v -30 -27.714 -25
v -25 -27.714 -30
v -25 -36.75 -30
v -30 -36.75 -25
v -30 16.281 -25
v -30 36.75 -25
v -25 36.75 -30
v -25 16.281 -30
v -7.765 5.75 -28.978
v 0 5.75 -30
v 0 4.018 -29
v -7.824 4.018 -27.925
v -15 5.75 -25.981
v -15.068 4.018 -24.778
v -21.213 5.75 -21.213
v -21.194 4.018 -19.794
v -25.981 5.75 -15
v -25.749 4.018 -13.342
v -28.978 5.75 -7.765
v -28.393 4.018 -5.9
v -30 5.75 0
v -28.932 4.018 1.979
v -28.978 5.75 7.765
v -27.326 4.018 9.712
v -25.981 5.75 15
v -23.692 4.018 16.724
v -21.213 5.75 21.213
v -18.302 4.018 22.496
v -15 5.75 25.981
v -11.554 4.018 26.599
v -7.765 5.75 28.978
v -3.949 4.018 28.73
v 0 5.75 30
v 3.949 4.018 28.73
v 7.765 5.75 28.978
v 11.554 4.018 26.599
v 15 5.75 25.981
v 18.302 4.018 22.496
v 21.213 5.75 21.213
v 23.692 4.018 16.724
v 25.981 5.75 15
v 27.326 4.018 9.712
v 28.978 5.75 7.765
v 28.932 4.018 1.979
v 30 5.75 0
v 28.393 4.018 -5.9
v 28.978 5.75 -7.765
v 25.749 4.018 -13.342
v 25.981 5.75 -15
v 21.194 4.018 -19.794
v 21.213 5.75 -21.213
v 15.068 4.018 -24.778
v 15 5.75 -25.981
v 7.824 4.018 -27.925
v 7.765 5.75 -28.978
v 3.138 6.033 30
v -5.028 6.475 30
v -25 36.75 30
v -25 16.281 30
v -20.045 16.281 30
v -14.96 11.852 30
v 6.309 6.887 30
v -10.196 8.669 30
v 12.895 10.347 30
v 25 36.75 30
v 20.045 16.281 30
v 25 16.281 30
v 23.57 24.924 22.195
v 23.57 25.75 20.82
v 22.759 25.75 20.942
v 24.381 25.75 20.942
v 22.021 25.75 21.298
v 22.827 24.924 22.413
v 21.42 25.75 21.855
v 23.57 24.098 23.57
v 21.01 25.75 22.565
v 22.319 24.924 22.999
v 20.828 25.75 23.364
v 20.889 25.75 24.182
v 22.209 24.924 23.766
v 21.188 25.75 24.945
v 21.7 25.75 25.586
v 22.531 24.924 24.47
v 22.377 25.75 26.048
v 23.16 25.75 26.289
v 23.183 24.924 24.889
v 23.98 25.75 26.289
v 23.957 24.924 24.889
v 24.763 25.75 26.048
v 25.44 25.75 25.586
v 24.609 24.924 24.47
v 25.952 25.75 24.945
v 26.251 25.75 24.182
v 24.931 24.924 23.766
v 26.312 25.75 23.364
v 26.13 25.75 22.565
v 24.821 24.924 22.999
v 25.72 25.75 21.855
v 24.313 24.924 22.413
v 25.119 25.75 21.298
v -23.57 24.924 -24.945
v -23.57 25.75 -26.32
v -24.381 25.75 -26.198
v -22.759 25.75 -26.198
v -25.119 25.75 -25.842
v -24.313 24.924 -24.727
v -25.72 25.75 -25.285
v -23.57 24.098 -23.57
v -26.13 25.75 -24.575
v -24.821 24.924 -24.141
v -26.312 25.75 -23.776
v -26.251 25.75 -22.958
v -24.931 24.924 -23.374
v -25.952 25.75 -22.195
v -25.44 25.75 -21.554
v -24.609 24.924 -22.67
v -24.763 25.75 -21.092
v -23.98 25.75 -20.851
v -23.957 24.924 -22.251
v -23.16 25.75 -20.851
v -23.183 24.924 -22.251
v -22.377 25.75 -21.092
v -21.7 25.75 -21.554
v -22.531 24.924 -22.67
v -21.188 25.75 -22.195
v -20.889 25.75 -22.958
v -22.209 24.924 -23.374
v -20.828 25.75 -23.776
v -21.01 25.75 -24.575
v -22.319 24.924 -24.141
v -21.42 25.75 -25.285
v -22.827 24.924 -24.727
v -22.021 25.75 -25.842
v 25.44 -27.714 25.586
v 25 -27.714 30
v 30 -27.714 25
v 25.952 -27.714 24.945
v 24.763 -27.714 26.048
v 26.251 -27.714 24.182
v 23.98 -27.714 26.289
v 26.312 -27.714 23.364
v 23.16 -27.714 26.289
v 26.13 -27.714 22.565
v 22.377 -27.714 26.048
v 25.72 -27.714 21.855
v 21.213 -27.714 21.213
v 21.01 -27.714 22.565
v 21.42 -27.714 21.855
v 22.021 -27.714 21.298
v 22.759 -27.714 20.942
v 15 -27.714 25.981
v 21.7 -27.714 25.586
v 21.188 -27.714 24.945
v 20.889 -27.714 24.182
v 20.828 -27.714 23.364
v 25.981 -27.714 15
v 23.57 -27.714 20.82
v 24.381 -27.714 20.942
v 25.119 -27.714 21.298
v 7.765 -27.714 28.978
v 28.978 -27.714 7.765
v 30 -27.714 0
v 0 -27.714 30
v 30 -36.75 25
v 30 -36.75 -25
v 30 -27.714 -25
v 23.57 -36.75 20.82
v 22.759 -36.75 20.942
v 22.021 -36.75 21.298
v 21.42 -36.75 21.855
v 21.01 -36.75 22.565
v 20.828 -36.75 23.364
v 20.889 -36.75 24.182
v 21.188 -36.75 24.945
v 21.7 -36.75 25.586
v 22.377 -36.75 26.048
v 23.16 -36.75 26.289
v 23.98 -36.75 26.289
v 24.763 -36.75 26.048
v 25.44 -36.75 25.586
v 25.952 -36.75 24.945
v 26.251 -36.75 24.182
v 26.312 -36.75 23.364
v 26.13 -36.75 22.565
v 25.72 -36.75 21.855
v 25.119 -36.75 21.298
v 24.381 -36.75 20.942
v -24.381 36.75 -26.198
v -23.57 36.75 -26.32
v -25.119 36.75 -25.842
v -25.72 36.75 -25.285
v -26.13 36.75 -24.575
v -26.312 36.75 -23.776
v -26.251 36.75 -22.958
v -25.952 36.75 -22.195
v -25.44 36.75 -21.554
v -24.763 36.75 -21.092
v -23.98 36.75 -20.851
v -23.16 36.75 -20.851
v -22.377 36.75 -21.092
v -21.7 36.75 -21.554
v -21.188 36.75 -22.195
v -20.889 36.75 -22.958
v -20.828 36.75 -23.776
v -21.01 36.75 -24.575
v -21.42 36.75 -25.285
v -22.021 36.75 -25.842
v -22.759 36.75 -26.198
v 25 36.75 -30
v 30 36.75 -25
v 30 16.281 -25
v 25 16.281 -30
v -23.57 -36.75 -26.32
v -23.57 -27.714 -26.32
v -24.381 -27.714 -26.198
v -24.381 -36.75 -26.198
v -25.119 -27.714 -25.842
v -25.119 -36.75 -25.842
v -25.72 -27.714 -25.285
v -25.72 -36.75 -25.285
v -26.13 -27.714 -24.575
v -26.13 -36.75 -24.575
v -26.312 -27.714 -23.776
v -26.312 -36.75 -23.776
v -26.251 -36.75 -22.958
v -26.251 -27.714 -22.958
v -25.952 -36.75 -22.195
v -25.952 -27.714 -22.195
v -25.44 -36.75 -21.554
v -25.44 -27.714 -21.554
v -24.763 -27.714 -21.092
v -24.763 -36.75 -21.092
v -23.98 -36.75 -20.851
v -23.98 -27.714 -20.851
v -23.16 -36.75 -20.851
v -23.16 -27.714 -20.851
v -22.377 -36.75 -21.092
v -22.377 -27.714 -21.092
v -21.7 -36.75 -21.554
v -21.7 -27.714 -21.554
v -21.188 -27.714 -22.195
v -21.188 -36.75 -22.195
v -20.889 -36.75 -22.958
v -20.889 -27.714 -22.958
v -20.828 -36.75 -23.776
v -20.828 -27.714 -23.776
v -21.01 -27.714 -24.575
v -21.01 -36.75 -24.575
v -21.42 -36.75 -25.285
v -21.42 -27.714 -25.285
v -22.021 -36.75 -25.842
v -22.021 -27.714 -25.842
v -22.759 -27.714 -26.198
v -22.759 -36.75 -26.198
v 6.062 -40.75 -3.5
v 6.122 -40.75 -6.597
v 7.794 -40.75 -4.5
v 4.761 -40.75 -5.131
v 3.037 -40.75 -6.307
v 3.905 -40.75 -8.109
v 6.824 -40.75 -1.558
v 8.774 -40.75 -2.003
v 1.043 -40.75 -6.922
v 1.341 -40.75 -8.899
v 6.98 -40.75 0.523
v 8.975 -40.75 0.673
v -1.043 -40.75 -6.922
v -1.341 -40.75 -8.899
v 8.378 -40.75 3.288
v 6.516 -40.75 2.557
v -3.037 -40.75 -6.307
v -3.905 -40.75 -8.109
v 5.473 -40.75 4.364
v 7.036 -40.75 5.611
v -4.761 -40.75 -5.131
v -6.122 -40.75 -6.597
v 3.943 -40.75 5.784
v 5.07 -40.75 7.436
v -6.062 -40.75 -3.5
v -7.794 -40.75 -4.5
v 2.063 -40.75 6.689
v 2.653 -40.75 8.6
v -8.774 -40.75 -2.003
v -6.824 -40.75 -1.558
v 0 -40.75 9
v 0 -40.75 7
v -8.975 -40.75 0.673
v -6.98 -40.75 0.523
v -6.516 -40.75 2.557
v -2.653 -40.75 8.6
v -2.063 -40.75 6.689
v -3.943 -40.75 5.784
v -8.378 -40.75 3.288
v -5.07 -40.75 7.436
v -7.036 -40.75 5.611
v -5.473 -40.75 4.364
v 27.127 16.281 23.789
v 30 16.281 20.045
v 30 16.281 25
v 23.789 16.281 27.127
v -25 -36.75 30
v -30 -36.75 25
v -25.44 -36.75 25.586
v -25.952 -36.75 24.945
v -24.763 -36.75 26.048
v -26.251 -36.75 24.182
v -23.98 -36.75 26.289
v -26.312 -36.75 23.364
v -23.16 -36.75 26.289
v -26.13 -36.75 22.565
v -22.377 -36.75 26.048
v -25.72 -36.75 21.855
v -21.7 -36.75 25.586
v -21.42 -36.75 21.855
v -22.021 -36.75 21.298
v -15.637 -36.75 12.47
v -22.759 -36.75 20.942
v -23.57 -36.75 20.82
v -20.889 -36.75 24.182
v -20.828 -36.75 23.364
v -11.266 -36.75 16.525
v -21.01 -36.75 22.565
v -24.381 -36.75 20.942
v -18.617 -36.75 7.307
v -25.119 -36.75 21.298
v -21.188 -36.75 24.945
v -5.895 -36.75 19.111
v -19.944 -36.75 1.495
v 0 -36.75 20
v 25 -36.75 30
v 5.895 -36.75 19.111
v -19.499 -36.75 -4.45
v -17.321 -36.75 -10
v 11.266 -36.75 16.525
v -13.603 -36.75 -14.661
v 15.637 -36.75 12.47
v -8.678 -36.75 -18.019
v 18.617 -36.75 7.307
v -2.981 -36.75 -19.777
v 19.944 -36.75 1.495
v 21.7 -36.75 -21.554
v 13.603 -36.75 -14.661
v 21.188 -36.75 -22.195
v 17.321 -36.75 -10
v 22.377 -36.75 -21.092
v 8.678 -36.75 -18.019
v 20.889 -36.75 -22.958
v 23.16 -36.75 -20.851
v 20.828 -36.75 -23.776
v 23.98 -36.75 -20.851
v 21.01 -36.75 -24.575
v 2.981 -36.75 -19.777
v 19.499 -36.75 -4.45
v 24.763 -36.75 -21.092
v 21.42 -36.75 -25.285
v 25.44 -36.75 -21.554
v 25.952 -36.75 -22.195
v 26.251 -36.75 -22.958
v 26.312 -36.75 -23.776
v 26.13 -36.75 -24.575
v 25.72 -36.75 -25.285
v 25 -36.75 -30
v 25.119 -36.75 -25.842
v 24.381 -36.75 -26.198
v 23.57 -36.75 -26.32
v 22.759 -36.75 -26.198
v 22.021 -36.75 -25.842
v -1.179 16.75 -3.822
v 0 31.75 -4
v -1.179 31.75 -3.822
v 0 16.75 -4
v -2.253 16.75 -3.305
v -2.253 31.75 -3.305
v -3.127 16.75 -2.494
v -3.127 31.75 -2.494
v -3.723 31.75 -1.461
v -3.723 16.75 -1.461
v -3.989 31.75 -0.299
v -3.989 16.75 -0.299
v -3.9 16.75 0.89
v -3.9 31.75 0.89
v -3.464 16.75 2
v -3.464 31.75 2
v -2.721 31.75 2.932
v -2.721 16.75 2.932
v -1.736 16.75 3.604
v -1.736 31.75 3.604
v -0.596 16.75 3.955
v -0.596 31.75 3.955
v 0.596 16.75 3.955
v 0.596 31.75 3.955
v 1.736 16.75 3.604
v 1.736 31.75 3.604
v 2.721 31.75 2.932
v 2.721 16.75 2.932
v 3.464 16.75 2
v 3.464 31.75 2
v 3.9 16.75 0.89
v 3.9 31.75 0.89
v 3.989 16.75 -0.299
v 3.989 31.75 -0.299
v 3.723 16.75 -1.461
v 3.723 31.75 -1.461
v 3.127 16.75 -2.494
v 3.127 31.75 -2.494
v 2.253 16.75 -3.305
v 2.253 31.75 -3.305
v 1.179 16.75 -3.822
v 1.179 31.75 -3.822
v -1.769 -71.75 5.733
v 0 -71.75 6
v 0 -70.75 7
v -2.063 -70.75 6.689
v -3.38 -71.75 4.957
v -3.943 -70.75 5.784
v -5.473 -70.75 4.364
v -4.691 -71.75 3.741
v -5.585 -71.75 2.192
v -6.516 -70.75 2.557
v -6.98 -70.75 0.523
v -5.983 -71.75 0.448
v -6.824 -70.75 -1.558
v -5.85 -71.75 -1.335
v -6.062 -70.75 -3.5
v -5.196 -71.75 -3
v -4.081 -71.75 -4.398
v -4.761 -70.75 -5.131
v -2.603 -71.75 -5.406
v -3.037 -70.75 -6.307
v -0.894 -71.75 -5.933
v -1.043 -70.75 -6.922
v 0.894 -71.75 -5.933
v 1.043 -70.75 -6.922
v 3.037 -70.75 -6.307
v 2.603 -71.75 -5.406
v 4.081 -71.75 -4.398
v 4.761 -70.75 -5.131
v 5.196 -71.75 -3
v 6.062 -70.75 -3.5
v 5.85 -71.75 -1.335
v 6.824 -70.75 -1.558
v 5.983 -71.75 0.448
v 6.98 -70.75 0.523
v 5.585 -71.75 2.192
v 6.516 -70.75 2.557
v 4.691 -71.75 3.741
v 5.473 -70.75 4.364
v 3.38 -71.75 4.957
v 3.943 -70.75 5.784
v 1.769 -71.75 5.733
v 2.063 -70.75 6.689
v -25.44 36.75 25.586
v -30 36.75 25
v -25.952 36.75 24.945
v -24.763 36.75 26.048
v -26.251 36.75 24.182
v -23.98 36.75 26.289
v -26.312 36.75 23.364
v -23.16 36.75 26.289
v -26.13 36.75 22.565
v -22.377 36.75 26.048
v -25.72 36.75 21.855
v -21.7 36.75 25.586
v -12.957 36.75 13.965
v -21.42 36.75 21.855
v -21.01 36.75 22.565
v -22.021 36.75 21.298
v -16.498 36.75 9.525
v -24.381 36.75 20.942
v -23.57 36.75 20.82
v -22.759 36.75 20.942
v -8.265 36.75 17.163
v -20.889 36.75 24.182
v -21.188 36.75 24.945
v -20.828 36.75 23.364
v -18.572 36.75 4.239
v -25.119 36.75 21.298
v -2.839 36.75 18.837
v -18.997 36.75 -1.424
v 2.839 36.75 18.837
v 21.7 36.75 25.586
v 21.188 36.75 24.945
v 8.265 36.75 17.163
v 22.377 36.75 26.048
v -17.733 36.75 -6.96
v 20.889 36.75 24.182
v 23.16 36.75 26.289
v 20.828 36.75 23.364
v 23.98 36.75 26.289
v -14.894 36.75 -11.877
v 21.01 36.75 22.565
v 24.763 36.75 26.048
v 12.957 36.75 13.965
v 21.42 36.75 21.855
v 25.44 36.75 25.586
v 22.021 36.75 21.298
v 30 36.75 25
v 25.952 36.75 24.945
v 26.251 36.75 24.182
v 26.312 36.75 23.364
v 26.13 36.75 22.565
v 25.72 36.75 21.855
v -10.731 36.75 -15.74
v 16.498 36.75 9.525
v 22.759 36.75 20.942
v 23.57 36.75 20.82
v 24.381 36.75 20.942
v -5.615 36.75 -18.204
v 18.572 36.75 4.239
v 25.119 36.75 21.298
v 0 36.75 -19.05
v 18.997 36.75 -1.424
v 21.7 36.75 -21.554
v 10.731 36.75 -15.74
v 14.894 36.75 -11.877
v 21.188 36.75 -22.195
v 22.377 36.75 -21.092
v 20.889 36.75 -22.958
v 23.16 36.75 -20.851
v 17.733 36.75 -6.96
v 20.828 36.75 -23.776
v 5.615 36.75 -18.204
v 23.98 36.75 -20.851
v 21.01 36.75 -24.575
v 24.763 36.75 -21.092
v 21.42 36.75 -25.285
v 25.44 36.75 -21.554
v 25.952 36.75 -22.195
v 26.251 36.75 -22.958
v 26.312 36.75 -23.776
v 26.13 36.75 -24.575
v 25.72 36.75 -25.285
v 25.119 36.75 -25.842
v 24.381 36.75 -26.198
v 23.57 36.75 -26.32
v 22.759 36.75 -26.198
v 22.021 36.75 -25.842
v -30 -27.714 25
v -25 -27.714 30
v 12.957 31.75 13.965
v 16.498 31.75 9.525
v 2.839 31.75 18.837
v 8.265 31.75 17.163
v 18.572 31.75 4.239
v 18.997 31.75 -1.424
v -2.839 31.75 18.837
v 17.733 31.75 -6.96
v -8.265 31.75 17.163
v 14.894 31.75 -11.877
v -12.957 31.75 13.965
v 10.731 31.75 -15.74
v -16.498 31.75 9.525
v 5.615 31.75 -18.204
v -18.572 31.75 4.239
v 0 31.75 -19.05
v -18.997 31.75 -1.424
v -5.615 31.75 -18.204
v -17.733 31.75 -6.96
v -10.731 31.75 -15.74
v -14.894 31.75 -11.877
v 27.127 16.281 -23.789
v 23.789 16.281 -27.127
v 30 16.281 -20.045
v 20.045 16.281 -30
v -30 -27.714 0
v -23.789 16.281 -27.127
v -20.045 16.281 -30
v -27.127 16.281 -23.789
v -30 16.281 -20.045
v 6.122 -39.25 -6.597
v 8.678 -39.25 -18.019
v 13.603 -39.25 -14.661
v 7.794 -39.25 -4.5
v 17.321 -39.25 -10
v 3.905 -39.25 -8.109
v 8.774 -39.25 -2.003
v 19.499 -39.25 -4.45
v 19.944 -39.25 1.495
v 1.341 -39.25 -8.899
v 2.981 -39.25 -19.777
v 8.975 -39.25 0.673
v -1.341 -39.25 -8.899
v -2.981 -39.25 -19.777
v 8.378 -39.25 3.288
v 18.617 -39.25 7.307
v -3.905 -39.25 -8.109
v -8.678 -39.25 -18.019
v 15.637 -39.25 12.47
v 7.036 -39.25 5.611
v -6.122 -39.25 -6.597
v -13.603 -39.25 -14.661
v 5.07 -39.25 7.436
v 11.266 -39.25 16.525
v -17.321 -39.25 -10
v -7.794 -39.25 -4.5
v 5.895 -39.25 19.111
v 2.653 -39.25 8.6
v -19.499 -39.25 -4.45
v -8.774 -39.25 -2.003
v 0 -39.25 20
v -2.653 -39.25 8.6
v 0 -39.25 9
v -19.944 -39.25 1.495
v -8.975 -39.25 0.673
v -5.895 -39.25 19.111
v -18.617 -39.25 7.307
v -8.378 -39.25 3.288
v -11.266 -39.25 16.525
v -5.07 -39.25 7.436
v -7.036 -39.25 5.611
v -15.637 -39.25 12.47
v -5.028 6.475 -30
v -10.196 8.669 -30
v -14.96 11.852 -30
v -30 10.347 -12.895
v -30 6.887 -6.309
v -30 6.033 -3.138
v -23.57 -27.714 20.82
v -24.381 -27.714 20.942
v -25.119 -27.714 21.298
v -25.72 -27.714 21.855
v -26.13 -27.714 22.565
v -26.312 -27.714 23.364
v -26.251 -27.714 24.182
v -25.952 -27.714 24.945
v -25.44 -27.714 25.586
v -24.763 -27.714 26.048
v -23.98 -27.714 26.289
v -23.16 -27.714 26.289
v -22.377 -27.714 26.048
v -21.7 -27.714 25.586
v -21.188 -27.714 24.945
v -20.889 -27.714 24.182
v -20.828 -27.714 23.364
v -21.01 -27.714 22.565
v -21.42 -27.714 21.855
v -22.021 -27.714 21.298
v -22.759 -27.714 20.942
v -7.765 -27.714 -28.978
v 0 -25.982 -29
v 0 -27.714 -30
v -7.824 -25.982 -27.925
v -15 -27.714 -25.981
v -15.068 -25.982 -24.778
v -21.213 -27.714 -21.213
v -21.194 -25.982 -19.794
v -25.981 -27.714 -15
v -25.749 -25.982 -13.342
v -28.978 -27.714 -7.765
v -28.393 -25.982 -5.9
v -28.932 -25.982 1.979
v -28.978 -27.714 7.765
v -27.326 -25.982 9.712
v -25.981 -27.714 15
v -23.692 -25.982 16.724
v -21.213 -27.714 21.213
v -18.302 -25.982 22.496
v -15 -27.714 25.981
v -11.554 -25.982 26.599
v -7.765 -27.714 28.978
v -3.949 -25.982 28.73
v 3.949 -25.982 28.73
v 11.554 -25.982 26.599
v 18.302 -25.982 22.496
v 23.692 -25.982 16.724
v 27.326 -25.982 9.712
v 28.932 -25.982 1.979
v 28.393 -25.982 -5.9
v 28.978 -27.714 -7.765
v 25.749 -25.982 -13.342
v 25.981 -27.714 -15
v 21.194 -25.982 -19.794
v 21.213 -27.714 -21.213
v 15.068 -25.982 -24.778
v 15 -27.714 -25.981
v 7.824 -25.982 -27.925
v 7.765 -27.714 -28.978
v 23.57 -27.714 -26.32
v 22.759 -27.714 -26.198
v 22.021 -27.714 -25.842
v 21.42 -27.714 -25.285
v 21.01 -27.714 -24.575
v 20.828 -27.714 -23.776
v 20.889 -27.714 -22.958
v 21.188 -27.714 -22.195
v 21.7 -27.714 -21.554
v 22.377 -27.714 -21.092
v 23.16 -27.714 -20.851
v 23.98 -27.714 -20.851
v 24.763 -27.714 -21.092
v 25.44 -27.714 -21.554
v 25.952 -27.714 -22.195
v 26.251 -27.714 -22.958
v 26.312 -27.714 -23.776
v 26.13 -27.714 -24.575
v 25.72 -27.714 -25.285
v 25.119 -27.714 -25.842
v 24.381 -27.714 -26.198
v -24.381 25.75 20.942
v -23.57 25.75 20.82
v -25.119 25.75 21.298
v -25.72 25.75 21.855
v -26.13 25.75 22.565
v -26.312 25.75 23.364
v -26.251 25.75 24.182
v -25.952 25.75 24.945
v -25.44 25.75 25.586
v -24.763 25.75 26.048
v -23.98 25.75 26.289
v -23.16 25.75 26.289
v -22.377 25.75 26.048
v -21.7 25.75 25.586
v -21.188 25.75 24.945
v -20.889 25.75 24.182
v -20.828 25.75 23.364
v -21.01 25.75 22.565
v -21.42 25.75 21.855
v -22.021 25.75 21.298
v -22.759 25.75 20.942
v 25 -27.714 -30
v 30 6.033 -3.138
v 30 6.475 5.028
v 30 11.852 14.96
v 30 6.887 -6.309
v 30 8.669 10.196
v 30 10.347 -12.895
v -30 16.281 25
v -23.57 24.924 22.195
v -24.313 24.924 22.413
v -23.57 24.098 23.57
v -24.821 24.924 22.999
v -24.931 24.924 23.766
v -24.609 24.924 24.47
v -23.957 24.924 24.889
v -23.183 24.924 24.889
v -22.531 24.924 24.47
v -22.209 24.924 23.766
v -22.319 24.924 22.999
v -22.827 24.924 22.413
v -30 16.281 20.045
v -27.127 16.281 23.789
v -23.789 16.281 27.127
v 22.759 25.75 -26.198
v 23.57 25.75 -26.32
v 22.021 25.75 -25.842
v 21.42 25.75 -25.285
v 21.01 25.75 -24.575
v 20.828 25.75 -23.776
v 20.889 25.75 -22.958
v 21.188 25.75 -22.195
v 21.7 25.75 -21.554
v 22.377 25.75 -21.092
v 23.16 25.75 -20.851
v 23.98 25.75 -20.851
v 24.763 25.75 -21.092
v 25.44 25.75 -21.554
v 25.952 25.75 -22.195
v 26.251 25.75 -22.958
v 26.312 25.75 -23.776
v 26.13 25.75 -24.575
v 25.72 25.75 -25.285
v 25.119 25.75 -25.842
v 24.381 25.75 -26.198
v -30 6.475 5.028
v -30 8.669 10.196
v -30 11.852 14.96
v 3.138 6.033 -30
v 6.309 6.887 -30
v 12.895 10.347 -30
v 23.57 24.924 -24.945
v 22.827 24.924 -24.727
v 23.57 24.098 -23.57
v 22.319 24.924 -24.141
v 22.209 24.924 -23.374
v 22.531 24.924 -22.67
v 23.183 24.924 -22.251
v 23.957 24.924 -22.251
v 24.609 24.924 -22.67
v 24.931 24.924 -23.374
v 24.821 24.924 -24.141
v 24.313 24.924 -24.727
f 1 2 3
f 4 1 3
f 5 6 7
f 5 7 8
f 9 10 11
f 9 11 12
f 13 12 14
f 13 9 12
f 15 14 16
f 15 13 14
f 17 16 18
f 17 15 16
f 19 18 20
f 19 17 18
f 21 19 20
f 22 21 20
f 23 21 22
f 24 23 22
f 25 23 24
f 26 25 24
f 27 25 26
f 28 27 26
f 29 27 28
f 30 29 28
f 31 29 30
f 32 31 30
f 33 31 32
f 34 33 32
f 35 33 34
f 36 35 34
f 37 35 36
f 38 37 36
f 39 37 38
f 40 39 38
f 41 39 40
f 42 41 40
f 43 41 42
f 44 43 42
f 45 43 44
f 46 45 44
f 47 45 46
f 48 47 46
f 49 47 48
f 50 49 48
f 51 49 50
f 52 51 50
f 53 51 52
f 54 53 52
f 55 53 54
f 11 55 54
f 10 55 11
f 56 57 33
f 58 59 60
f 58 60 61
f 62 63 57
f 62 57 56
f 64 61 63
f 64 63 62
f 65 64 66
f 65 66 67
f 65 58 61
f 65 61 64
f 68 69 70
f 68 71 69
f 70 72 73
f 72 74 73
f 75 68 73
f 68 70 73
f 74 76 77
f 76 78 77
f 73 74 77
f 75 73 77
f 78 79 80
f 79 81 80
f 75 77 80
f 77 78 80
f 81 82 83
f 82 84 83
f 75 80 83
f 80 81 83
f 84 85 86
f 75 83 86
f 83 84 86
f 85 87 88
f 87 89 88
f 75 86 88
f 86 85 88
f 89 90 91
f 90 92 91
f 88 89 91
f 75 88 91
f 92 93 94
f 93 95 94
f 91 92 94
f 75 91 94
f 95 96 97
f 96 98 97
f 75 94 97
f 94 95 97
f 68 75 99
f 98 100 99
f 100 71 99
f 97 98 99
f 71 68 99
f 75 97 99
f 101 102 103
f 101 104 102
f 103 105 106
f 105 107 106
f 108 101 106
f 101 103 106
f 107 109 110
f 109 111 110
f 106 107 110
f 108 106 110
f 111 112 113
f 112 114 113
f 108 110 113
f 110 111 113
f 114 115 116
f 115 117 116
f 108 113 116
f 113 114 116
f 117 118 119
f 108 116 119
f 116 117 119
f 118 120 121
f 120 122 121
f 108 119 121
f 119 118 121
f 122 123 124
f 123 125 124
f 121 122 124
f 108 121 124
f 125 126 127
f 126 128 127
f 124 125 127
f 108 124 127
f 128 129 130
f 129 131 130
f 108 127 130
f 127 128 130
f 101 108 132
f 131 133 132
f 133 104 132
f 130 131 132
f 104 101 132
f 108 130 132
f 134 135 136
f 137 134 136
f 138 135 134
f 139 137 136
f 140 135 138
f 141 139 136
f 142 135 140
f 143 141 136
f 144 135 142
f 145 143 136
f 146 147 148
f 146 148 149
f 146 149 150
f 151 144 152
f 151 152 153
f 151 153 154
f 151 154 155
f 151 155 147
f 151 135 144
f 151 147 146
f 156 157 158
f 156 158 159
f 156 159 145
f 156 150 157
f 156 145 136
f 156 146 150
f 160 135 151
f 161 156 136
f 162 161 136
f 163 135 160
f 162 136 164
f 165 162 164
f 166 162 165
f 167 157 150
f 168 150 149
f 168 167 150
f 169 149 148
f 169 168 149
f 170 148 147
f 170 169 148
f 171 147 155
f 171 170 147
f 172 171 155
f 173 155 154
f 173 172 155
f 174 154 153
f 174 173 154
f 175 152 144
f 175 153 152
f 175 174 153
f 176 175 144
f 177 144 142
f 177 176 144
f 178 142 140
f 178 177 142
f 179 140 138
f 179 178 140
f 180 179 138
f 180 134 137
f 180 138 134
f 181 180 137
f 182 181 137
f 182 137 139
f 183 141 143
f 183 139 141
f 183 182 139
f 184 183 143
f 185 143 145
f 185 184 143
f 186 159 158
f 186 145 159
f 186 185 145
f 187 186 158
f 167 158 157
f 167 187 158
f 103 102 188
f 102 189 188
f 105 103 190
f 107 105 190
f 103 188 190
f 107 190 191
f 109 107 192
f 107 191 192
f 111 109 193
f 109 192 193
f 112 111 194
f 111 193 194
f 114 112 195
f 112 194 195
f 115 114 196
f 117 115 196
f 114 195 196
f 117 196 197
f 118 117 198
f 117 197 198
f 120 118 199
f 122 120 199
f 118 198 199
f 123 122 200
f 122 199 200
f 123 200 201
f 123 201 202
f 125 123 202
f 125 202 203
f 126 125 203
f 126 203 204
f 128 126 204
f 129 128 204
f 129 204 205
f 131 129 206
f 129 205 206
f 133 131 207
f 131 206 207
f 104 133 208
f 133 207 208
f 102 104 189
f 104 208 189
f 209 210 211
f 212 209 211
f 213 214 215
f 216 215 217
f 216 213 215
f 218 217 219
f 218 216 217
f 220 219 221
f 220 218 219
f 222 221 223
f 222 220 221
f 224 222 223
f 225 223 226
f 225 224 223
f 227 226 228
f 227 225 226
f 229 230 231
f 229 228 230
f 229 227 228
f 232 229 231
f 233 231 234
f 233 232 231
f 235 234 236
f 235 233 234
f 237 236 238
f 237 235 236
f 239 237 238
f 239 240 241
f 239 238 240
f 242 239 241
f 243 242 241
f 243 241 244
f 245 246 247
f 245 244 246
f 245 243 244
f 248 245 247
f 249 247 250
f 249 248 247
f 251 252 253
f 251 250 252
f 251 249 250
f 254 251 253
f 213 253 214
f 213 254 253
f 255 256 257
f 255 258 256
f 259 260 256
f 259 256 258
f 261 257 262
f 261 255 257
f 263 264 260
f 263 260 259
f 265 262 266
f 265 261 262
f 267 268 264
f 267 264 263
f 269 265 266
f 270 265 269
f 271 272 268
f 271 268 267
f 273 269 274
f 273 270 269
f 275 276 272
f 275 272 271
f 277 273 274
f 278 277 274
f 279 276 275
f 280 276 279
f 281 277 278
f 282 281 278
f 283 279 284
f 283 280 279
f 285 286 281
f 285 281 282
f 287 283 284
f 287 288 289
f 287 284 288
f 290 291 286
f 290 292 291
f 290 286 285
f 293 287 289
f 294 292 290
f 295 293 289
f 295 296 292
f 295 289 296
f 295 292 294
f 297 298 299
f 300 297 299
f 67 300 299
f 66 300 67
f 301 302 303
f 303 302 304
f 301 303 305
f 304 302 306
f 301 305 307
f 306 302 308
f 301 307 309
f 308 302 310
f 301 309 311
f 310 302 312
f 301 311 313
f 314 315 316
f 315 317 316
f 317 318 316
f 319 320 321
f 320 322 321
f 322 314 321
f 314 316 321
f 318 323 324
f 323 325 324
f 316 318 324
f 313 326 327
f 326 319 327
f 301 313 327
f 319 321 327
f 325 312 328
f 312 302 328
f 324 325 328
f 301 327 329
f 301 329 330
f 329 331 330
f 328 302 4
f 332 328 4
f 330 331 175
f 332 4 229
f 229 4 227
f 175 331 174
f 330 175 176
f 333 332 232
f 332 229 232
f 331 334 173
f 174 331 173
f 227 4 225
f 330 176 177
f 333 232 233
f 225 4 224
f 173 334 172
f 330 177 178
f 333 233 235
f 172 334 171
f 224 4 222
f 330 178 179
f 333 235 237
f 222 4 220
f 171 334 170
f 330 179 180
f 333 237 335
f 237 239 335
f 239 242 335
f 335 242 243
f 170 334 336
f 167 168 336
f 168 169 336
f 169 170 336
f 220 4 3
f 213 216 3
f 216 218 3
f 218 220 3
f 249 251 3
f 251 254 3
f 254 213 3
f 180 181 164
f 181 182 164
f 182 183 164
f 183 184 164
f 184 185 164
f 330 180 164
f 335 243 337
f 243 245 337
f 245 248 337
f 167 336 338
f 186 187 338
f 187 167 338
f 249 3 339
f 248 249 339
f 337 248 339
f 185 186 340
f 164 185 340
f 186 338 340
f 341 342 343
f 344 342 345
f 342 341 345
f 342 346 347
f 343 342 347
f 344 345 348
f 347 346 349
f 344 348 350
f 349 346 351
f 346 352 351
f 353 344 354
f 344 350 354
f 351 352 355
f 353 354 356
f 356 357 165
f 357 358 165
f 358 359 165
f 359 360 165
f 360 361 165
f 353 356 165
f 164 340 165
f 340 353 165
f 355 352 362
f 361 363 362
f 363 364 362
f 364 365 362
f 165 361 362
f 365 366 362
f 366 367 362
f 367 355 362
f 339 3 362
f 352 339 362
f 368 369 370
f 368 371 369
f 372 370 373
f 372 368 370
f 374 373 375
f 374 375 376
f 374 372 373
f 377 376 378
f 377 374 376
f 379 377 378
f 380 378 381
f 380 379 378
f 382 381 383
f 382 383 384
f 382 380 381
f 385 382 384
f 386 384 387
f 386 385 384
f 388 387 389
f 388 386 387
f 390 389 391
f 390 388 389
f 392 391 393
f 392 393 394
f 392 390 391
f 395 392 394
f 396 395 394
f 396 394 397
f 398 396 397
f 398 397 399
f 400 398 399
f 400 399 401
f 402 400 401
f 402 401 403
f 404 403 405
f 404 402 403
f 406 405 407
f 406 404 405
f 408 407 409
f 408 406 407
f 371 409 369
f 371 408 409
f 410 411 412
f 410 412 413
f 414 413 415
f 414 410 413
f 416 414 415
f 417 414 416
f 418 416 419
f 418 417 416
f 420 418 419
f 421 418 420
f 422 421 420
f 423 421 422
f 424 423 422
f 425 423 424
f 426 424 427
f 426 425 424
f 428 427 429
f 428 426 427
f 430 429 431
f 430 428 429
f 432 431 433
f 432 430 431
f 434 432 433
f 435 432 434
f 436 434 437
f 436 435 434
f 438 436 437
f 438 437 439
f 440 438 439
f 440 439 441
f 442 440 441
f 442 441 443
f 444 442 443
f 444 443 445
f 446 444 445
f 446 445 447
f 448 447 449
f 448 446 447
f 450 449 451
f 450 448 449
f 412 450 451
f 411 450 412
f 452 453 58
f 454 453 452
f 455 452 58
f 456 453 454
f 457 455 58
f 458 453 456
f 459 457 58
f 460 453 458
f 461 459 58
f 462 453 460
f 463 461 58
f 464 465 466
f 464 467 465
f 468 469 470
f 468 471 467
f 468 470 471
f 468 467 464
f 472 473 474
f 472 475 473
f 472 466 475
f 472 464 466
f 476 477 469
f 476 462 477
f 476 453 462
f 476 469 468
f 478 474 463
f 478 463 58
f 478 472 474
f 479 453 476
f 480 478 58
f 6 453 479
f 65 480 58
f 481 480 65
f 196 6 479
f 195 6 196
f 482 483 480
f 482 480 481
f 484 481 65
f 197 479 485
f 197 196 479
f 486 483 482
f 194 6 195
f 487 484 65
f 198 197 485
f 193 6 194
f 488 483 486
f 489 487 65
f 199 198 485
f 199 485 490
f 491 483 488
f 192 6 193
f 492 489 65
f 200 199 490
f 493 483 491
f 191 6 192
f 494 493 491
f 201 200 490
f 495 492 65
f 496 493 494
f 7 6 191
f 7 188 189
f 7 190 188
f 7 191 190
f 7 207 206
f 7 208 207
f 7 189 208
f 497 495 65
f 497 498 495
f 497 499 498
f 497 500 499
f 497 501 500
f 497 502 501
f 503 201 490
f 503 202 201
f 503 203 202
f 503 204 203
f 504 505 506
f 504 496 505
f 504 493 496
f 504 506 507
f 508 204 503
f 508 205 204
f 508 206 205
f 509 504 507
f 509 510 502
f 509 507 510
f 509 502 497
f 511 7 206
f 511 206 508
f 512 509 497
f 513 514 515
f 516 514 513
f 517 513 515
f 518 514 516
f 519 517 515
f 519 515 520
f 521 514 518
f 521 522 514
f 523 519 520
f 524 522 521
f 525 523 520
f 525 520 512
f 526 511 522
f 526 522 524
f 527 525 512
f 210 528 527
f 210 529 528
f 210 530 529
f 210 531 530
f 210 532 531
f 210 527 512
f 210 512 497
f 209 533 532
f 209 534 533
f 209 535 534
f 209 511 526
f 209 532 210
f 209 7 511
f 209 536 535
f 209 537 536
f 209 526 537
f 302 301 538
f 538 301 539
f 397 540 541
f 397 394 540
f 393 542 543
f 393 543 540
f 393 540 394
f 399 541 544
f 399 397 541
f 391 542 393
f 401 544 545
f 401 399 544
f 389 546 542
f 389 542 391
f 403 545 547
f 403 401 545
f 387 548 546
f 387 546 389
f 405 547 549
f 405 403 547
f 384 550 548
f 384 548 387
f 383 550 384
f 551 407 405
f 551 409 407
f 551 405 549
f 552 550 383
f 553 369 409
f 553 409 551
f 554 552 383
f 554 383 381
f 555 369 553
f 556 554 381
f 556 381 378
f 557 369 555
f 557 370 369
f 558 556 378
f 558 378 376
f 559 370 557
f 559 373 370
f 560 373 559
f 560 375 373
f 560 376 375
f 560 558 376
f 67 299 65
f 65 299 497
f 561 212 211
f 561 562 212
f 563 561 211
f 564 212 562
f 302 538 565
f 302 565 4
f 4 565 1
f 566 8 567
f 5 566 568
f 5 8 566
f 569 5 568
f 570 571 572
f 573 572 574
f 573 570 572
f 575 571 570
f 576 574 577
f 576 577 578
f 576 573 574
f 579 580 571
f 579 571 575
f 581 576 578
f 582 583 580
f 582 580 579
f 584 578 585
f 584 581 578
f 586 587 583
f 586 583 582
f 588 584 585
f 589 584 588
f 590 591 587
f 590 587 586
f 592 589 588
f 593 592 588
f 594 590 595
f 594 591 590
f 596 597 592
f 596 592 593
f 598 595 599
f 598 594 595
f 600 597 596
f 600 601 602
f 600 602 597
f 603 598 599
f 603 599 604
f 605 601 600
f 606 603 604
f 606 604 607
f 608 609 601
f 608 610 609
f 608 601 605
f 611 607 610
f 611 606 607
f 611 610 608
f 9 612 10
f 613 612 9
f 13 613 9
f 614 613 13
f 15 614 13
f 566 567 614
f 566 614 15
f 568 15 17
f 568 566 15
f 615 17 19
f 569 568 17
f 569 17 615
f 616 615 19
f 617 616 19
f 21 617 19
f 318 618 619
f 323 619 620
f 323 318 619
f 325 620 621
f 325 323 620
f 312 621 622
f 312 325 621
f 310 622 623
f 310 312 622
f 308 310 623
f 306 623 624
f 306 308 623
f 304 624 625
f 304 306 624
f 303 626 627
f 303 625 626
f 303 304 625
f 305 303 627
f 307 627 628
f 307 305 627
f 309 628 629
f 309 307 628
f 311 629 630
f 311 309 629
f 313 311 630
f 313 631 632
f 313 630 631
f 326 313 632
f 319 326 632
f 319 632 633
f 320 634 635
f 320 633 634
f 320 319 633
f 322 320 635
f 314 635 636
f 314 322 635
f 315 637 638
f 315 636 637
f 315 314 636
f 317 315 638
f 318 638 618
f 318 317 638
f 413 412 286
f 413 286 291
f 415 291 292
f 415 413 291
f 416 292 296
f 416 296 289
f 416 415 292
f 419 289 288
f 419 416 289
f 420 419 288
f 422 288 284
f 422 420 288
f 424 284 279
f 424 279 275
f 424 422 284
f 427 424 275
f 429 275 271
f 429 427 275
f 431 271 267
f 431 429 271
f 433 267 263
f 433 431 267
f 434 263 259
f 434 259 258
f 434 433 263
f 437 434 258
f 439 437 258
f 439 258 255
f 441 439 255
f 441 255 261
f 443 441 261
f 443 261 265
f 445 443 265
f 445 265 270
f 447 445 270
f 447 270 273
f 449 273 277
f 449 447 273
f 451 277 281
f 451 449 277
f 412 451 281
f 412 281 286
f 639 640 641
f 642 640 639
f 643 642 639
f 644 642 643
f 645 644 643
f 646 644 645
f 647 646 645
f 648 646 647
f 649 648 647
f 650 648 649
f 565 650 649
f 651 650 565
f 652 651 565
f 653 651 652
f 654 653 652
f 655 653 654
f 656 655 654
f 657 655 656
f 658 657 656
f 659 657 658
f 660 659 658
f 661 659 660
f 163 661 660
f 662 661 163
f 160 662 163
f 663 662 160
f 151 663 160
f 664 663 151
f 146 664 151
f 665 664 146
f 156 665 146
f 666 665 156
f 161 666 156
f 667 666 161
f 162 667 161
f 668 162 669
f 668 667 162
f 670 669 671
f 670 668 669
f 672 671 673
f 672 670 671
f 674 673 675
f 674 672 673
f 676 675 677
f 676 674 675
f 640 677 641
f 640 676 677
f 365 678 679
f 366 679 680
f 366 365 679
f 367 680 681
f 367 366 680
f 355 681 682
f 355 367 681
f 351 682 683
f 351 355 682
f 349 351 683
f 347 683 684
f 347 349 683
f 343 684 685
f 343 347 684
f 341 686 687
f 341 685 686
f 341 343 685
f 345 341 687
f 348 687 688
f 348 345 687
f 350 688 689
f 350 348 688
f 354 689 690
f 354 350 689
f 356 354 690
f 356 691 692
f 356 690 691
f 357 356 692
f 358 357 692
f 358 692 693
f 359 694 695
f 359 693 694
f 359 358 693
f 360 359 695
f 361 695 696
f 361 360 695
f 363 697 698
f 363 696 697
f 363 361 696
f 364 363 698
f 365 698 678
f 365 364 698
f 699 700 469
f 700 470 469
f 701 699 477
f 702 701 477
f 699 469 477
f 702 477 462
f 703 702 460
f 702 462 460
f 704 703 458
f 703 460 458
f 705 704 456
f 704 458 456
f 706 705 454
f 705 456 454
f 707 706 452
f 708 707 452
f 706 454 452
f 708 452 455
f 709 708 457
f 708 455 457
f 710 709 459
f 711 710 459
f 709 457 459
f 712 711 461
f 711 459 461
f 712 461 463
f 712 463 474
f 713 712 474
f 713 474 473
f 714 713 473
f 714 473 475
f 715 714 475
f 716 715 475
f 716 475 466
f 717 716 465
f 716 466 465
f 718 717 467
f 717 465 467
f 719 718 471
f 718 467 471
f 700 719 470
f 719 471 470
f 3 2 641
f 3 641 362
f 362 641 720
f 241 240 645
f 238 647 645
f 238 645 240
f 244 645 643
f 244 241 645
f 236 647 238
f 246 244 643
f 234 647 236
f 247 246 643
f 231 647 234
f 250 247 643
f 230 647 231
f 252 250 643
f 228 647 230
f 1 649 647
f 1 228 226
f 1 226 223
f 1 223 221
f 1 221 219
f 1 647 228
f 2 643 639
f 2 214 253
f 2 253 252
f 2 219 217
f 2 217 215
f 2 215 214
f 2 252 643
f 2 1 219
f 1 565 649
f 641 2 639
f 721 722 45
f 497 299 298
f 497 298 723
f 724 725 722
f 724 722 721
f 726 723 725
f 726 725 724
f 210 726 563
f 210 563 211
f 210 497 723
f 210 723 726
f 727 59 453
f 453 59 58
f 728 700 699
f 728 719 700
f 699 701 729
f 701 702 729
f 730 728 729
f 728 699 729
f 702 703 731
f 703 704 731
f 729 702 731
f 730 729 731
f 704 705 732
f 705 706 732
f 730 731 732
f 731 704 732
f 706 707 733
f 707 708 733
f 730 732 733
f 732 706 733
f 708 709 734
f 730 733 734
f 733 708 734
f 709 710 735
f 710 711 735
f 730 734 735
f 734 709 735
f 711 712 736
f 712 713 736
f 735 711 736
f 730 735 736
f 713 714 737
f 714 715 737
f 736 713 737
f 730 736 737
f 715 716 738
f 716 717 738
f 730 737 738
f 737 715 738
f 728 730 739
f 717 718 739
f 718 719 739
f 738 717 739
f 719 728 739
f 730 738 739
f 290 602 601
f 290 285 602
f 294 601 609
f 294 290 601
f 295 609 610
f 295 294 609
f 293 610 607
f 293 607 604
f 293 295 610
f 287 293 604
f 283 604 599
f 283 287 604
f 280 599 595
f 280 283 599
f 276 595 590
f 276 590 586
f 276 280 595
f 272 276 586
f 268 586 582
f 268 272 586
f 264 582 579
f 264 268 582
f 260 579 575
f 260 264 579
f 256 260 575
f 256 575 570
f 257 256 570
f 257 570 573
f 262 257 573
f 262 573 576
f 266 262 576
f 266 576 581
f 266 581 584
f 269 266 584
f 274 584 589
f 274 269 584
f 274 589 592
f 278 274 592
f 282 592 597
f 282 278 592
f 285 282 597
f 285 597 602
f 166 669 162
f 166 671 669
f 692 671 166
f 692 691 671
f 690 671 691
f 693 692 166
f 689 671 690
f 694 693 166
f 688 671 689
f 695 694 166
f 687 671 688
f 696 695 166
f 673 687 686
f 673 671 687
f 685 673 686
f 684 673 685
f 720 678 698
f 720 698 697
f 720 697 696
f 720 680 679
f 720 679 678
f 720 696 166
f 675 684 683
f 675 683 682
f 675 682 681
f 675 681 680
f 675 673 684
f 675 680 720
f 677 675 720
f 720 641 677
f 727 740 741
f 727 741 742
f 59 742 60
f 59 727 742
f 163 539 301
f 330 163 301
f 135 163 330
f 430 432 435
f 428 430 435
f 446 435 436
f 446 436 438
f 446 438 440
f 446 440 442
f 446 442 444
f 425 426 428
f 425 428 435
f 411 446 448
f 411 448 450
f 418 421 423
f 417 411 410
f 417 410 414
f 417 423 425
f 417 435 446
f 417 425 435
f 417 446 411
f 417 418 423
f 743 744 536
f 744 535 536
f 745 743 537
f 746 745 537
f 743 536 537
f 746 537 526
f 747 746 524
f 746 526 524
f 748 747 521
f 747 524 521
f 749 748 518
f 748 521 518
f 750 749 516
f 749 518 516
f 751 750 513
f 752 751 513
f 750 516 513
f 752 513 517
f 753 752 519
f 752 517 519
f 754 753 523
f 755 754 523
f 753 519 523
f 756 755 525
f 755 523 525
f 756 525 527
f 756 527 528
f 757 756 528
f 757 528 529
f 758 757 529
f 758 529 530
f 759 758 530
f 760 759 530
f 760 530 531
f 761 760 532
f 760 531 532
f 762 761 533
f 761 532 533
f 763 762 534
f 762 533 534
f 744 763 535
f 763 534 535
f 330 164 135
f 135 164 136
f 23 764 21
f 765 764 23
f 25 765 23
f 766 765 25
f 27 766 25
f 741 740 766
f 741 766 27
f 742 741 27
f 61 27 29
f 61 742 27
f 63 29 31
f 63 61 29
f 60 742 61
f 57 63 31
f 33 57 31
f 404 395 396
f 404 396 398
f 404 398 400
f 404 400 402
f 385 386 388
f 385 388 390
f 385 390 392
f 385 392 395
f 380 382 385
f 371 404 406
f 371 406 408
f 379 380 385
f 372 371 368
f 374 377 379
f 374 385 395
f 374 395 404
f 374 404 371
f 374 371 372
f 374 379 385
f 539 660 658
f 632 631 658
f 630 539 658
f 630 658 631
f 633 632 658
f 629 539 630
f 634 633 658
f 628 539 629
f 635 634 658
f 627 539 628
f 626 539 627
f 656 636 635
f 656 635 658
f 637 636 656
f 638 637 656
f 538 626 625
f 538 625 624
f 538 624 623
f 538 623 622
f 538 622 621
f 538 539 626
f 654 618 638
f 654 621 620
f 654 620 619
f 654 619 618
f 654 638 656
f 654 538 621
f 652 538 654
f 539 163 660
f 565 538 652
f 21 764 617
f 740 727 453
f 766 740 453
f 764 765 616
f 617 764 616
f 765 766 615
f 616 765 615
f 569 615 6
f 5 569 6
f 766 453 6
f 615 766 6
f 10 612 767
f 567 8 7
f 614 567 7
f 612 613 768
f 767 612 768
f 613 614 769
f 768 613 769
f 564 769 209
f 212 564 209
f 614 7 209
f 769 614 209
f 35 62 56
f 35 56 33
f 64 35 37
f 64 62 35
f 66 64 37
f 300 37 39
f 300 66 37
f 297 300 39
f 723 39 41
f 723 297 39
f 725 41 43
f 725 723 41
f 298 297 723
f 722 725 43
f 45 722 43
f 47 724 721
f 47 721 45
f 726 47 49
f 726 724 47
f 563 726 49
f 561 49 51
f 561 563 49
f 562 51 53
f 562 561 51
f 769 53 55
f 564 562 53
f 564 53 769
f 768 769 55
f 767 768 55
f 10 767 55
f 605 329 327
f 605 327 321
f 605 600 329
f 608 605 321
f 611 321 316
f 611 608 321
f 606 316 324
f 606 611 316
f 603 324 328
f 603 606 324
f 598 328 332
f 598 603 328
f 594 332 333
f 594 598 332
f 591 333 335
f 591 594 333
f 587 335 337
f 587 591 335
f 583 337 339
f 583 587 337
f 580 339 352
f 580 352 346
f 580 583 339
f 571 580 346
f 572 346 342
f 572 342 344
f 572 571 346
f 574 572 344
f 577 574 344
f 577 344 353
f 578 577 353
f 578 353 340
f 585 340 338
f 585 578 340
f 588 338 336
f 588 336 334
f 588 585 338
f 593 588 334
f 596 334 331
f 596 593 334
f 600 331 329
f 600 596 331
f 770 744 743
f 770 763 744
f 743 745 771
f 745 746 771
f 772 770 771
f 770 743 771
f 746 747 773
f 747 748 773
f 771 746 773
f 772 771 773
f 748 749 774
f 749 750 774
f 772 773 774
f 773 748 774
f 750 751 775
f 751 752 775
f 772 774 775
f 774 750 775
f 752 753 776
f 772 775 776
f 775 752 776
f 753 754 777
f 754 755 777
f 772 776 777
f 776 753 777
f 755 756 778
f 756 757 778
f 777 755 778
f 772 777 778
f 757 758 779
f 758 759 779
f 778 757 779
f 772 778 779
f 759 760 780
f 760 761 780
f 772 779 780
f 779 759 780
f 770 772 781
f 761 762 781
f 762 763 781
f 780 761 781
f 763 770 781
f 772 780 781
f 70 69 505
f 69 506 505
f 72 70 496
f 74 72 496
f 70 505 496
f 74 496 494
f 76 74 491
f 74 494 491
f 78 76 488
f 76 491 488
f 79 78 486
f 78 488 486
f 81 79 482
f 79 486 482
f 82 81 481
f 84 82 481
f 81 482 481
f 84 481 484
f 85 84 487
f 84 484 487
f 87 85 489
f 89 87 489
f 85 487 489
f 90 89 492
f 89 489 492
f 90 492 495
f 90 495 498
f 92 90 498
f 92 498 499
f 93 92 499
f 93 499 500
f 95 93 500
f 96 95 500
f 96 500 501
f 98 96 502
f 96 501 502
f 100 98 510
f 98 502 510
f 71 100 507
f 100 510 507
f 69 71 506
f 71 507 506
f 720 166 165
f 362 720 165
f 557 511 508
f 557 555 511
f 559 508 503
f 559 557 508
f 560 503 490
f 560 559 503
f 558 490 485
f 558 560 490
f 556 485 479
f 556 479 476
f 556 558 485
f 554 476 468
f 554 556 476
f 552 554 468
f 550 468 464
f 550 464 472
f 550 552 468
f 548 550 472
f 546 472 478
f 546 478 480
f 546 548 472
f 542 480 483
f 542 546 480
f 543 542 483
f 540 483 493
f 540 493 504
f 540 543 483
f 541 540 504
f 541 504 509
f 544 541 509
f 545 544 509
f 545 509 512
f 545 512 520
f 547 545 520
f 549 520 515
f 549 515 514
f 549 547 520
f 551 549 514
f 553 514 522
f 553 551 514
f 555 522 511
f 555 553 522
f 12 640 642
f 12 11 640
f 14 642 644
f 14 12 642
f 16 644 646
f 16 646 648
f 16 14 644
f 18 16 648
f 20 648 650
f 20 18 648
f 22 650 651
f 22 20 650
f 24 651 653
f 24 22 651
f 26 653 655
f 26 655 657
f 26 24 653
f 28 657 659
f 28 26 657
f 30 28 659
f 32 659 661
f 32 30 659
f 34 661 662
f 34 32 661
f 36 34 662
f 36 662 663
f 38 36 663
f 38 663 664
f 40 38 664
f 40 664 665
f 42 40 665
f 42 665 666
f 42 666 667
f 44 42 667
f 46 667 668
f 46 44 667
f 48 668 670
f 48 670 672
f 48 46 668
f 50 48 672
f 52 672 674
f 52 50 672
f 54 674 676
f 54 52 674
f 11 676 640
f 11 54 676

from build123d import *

# Parameters (mm, degrees)
SZKIC1_W                     = 60
SZKIC1_H                     = 60
DODANIE_WYCI_GNI_CIE1_DEPTH  = 36.75
SFAZOWANIE1_SIZE             = 5
SFAZOWANIE2_SIZE             = 1
OTW_R_POD_RUB_M51_AT_2_COUNT = 2
OTW_R_POD_RUB_M51_AT_2_PITCH = 47.14
OTW_R_POD_RUB_M51_AT_3_COUNT = 2
OTW_R_POD_RUB_M51_AT_3_PITCH = 66.66602733
OTW_R_POD_RUB_M51_AT_4_COUNT = 2
OTW_R_POD_RUB_M51_AT_4_PITCH = 47.14


with BuildPart() as part:
    # Szkic1 → Dodanie-wyciągnięcie1 (new, symmetric)
    with BuildSketch(Plane(origin=(0, 0, 0), x_dir=(1, 0, 0), z_dir=(0, 1, 0))):
        Rectangle(SZKIC1_W, SZKIC1_H)
    extrude(amount=DODANIE_WYCI_GNI_CIE1_DEPTH, both=True)

    # Szkic2 → Wycięcie-obrót1 (revolve, cut)
    with BuildSketch(Plane.XY, mode=Mode.PRIVATE) as wyci_cie_obr_t1_sk:
        Polygon((29, 4.017949192), (30, 5.75), (36.080330081, 16.281440627), (59, 16.281440627), (59, -27.714101615), (30, -27.714101615), (29, -25.982050808), align=None)
    revolve(wyci_cie_obr_t1_sk.sketch.rotate(Axis((0, 0, 0), (0, 1, 0)), 90), axis=Axis((0, 0, 0), (0, 1, 0)), mode=Mode.SUBTRACT)

    # Sfazowanie1
    sfazowanie1_edges = [part.edges().sort_by_distance(p)[0] for p in [
        (30, -32.232050808, 30),
        (-30, -32.232050808, 30),
        (-30, -32.232050808, -30),
        (30, -32.232050808, -30),
        (30, 26.515720314, 30),
        (-30, 26.515720314, 30),
        (-30, 26.515720314, -30),
        (30, 26.515720314, -30),
    ]]
    chamfer(sfazowanie1_edges, length=SFAZOWANIE1_SIZE)

    # Szkic4 → Wycięcie-obrót3 (revolve, cut)
    with BuildSketch(Plane.XY, mode=Mode.PRIVATE) as wyci_cie_obr_t3_sk:
        Polygon((0, 36.75), (19.05, 36.75), (19.05, 31.75), (4, 31.75), (4, 16.75), (0, 16.75), align=None)
    revolve(wyci_cie_obr_t3_sk.sketch.rotate(Axis((0, 0, 0), (0, 1, 0)), 90), axis=Axis((0, 0, 0), (0, 1, 0)), mode=Mode.SUBTRACT)

    # Szkic5 → Obrót1 (revolve)
    with BuildSketch(Plane(origin=(0, 0, 0), x_dir=(0, 0, -1), z_dir=(1, 0, 0)), mode=Mode.PRIVATE) as obr_t1_sk:
        Polygon((0, -36.75), (20, -36.75), (20, -39.25), (9, -39.25), (9, -40.75), (7, -40.75), (7, -71.75), (0, -71.75), align=None)
    revolve(obr_t1_sk.sketch.rotate(Axis((0, 0, 0), (0, -1, 0)), 180), axis=Axis((0, 0, 0), (0, -1, 0)))

    # Sfazowanie2
    sfazowanie2_edges = [part.edges().sort_by_distance(p)[0] for p in [
        (0, -71.75, -7),
    ]]
    chamfer(sfazowanie2_edges, length=SFAZOWANIE2_SIZE)

    # Szkic7 → Otwór pod śrubę M51 (revolve, cut)
    with BuildSketch(Plane(origin=(23.57, -36.75, -23.57), x_dir=(0, 0, -1), z_dir=(1, 0, 0))):
        Polygon((0, 0), (0, 12.652366702), (2.75, 11), (2.75, 0), align=None)
    otw_r_pod_rub_m51 = revolve(axis=Axis((23.57, -43.1, -23.57), (0, 1, 0)), mode=Mode.SUBTRACT)

    # Otwór pod śrubę M51 at 2: Otwór pod śrubę M51 ×2
    with Locations(*[(-i * OTW_R_POD_RUB_M51_AT_2_PITCH, 0, 0) for i in range(1, OTW_R_POD_RUB_M51_AT_2_COUNT)]):
        add(otw_r_pod_rub_m51, mode=Mode.SUBTRACT)

    # Otwór pod śrubę M51 at 3: Otwór pod śrubę M51 ×2
    with Locations(*[Vector(-0.7071067811865477, 0, 0.7071067811865475) * (i * OTW_R_POD_RUB_M51_AT_3_PITCH) for i in range(1, OTW_R_POD_RUB_M51_AT_3_COUNT)]):
        add(otw_r_pod_rub_m51, mode=Mode.SUBTRACT)

    # Otwór pod śrubę M51 at 4: Otwór pod śrubę M51 ×2
    with Locations(*[(0, 0, i * OTW_R_POD_RUB_M51_AT_4_PITCH) for i in range(1, OTW_R_POD_RUB_M51_AT_4_COUNT)]):
        add(otw_r_pod_rub_m51, mode=Mode.SUBTRACT)

    # Lustro1: Otwór pod śrubę M51 across plane
    add(otw_r_pod_rub_m51.mirror(Plane.ZX), mode=Mode.SUBTRACT)

    # Lustro1 copy 1 sketch → Lustro1 copy 1 (revolve, cut)
    with BuildSketch(Plane(origin=(-23.57, 36.75, -23.57), x_dir=(0, 0, -1), z_dir=(1, 0, 0))):
        Polygon((0, 0), (0, -12.652366702), (2.75, -11), (2.75, 0), align=None)
    revolve(axis=Axis((-23.57, 43.1, -23.57), (0, 1, 0)), mode=Mode.SUBTRACT)

    # Lustro1 copy 2 sketch → Lustro1 copy 2 (revolve, cut)
    with BuildSketch(Plane(origin=(-23.57, 36.75, 23.57), x_dir=(0, 0, -1), z_dir=(1, 0, 0))):
        Polygon((0, 0), (0, -12.652366702), (2.75, -11), (2.75, 0), align=None)
    revolve(axis=Axis((-23.57, 43.1, 23.57), (0, 1, 0)), mode=Mode.SUBTRACT)

    # Lustro1 copy 3 sketch → Lustro1 copy 3 (revolve, cut)
    with BuildSketch(Plane(origin=(23.57, 36.75, 23.57), x_dir=(0, 0, -1), z_dir=(1, 0, 0))):
        Polygon((0, 0), (0, -12.652366702), (2.75, -11), (2.75, 0), align=None)
    revolve(axis=Axis((23.57, 43.1, 23.57), (0, 1, 0)), mode=Mode.SUBTRACT)


solid = part.part
